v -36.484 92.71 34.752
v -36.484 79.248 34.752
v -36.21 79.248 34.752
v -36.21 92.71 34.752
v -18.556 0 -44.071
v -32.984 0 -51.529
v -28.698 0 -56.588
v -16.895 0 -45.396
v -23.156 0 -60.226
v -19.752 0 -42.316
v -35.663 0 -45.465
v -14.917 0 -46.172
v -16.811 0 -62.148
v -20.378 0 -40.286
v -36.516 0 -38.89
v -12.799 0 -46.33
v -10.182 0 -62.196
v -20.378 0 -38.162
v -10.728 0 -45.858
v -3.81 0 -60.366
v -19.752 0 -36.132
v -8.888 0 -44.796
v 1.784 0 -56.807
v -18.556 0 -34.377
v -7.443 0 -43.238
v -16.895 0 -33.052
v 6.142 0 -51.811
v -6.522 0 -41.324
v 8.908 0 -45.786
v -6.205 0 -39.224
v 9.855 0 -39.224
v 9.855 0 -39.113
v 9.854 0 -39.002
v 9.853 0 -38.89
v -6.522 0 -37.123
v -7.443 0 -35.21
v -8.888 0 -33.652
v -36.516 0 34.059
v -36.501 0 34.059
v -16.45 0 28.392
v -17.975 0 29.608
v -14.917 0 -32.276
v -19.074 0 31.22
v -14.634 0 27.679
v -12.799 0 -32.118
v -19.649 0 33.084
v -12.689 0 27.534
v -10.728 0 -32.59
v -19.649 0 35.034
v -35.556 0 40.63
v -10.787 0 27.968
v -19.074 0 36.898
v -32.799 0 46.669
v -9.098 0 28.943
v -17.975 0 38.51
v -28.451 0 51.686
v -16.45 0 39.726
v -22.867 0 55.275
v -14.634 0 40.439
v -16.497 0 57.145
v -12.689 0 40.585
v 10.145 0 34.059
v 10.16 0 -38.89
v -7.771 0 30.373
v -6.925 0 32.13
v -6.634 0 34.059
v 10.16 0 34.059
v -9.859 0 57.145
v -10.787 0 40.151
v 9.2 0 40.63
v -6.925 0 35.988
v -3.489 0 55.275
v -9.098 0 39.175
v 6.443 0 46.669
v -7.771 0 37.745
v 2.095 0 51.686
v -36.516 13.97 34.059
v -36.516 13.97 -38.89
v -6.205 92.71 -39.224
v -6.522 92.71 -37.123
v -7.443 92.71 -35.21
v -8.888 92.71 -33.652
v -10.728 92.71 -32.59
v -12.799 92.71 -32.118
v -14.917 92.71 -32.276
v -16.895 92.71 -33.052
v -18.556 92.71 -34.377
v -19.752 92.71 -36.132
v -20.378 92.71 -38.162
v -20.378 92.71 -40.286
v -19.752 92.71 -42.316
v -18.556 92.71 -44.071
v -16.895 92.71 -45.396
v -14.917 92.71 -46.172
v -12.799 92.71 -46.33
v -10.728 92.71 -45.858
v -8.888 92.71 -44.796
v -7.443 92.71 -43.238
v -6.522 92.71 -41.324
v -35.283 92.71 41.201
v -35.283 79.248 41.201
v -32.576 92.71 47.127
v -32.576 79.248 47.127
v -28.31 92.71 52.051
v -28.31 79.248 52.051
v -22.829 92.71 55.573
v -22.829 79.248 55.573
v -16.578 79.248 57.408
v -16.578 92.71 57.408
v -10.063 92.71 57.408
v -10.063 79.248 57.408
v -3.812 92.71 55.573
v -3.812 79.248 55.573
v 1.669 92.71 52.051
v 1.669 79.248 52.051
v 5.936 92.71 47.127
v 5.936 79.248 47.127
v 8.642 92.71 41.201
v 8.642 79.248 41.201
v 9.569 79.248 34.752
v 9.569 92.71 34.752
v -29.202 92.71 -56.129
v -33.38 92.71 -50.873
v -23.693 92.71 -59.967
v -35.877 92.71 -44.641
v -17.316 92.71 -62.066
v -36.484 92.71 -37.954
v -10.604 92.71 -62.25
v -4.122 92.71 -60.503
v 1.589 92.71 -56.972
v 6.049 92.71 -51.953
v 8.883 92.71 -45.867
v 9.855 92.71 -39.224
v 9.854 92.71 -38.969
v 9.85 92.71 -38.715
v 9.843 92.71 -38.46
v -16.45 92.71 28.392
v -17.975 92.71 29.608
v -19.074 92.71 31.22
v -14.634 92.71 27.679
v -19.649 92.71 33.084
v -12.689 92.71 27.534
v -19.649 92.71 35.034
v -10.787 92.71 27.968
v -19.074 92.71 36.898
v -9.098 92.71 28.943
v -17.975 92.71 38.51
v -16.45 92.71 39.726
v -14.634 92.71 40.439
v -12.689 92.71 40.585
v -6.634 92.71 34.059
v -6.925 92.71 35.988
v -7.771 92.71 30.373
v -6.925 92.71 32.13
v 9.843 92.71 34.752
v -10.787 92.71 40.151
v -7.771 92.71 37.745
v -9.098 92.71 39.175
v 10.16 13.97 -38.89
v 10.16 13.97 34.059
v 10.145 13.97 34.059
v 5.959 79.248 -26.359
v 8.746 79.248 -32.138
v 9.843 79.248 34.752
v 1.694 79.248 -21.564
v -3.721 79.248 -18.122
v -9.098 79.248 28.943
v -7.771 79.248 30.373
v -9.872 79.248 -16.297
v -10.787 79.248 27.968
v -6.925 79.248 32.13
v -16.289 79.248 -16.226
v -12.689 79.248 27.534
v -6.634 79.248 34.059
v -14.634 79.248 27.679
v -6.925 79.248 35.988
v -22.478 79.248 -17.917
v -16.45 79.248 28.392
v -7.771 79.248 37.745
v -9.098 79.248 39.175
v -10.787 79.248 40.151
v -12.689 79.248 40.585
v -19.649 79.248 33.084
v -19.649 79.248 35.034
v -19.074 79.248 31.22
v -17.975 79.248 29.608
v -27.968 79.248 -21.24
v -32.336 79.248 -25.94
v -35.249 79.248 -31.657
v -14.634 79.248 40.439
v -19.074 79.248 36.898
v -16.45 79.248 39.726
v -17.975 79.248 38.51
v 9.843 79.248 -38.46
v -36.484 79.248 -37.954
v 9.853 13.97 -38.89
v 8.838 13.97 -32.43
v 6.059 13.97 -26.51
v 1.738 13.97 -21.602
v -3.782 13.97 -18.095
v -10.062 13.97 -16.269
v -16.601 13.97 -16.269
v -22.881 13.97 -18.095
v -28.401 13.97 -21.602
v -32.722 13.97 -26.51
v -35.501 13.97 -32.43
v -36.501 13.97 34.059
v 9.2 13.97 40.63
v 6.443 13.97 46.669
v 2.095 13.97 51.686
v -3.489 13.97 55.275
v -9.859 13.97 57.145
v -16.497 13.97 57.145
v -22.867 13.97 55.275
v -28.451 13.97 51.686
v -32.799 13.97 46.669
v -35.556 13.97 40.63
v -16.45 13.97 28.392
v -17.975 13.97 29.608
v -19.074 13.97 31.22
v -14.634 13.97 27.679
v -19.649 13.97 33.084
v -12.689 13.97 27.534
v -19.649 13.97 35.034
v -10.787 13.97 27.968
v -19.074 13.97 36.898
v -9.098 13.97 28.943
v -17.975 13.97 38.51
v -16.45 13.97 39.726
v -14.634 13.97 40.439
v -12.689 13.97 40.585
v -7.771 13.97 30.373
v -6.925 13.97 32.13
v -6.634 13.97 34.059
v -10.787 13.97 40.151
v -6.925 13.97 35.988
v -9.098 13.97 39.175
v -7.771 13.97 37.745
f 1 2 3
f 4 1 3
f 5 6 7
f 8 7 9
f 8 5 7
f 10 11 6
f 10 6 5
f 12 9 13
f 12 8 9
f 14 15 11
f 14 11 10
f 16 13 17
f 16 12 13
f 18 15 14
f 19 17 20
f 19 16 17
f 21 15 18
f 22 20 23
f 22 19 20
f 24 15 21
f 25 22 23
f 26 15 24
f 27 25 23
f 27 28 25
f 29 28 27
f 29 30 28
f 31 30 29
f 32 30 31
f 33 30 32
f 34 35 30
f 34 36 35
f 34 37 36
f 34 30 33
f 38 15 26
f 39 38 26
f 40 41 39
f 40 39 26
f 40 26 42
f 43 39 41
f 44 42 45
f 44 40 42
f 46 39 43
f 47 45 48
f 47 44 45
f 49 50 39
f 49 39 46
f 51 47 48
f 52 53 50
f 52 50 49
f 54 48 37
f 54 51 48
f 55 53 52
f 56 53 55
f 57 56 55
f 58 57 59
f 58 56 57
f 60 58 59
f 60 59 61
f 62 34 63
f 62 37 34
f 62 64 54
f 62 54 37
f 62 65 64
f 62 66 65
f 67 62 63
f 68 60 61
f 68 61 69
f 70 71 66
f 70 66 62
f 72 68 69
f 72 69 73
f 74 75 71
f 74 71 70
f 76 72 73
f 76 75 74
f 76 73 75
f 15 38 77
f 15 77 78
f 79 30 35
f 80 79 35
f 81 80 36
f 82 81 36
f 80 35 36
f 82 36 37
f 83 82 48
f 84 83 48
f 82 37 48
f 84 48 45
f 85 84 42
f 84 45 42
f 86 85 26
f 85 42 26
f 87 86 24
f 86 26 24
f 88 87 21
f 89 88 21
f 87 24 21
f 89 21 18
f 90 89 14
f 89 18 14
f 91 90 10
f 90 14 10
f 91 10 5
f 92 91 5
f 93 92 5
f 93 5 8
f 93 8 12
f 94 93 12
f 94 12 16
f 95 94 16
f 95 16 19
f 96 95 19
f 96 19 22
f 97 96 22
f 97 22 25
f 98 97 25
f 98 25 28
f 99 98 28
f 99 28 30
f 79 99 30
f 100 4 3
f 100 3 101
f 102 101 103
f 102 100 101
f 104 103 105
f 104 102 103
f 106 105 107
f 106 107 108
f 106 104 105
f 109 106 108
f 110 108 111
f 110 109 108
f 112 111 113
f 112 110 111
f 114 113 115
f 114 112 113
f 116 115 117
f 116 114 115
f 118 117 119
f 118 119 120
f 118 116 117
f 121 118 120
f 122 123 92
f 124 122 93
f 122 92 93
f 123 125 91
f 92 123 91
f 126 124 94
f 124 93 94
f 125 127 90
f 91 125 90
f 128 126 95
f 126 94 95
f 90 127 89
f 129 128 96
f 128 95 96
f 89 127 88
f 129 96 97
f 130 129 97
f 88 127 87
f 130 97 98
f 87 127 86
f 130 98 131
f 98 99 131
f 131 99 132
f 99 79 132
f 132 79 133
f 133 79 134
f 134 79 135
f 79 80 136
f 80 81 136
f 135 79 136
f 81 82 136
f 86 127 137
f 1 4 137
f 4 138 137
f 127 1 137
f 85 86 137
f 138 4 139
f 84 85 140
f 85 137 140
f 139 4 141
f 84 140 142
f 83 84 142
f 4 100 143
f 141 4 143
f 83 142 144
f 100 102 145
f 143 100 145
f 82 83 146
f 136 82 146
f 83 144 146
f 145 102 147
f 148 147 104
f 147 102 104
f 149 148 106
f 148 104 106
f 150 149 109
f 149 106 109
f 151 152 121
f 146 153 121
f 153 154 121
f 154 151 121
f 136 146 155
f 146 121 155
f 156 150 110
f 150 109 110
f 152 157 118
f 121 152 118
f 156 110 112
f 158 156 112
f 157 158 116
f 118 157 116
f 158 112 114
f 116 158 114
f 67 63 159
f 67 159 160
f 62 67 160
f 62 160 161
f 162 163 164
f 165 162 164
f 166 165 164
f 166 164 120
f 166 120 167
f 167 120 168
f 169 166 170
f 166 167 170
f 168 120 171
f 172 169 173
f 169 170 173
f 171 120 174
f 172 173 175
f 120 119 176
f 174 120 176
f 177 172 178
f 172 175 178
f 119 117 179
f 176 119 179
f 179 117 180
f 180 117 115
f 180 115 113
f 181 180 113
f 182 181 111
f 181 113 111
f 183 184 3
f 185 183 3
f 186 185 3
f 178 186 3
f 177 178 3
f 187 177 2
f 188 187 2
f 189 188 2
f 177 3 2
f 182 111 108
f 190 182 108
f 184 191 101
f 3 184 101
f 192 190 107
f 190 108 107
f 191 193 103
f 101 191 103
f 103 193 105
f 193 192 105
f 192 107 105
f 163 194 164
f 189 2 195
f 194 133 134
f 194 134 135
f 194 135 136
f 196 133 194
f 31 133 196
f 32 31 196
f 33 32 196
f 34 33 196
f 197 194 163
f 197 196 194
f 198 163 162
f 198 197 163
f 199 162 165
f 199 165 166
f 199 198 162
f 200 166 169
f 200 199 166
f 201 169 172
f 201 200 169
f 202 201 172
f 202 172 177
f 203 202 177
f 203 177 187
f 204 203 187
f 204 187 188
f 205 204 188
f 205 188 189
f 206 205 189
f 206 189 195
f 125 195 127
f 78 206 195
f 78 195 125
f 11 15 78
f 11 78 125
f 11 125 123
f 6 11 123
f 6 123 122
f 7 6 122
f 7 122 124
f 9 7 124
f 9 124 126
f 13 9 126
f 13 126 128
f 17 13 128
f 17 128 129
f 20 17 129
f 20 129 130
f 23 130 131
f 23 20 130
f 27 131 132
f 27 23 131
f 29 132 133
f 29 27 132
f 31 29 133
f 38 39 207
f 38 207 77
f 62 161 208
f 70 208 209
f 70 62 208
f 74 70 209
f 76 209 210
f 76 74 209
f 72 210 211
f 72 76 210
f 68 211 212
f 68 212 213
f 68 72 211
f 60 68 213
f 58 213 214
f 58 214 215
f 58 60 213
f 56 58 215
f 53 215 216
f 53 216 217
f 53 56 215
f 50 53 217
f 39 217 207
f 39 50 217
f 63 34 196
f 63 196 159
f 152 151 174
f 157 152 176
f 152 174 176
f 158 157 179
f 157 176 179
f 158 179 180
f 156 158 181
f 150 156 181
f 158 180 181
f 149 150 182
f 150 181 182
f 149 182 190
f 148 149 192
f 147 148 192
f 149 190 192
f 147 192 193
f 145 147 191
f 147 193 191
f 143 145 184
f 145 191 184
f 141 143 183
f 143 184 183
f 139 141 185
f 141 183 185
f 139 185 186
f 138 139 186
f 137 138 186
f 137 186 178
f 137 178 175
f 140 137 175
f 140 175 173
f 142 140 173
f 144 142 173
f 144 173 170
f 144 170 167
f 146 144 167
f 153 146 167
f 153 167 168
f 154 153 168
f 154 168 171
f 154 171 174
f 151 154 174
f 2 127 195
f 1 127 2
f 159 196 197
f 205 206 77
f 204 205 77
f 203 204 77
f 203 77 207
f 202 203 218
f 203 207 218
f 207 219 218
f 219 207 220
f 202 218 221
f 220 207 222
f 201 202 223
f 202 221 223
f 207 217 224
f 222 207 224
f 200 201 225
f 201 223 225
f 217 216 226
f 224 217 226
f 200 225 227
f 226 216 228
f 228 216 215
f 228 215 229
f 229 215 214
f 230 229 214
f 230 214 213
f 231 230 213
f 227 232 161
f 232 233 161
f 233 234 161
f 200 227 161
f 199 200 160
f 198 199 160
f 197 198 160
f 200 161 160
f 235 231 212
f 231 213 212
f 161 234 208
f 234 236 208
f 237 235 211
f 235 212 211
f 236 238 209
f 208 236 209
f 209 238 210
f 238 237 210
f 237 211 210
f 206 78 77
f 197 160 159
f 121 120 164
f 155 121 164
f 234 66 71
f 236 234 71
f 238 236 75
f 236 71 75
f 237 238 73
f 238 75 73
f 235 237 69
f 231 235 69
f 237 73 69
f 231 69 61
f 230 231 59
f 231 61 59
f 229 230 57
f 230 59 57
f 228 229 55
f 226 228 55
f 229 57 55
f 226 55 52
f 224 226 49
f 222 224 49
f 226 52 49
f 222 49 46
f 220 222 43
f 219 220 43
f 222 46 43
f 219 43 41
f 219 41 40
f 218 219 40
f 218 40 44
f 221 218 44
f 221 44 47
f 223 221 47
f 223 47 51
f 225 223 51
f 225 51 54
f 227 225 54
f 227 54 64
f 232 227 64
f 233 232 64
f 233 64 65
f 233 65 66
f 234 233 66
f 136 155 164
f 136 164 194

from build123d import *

# Parameters (mm, degrees)
F0_R      = 23.1868953792
F1_DEPTH  = 92.71
F3_DEPTH  = 13.97
F5_DEPTH  = 13.97
F7_DEPTH  = 13.462
F9_DEPTH  = 13.462
F10_R     = 7.1263406122
F11_DEPTH = 92.711
F12_R     = 6.5437745526
F13_DEPTH = 92.711


with BuildPart() as f1:
    # F0 (on Front) → F1 (new body)
    with BuildSketch(Plane.XZ):
        with Locations((-13.3315408602, -39.2239503562)):
            Circle(F0_R)
    extrude(amount=-F1_DEPTH)

    # F2 (on face) → F3 (join)
    with BuildSketch(Plane.XZ):
        with BuildLine():
            Line((-36.5160371978, 34.0590924025), (-36.5160371978, -38.8904134022))
            ThreePointArc((-36.5160371978, -38.8904134022), (-13.3315408602, -16.0370549771), (9.8529554773, -38.8904134022))
            Line((9.8529554773, -38.8904134022), (10.1600009948, -38.8904134022))
            Line((10.1600009948, -38.8904134022), (10.1600009948, 34.0590924025))
            Line((10.1600009948, 34.0590924025), (-36.5160371978, 34.0590924025))
        make_face()
    extrude(amount=-F3_DEPTH)

    # F4 (on face) → F5 (join)
    with BuildSketch(Plane.XZ):
        with BuildLine():
            Line((-36.5011457602, 34.0590924025), (10.1451095572, 34.0590924025))
            ThreePointArc((10.1451095572, 34.0590924025), (-13.1780181015, 57.3822200612), (-36.5011457602, 34.0590924025))
        make_face()
    extrude(amount=-F5_DEPTH)

    # F6 (on face) → F7 (join)
    with BuildSketch(Plane(origin=(0, 92.71, 0), x_dir=(-1, 0, 0), z_dir=(0, 1, 0))):
        with BuildLine():
            Line((-9.8427801074, 34.751817584), (-9.8427801074, -38.4604289001))
            ThreePointArc((-9.8427801074, -38.4604289001), (13.0780994515, -16.038440123), (36.4836342633, -37.954033673))
            Line((36.4836342633, -37.954033673), (36.4836342633, 34.751817584))
            Line((36.4836342633, 34.751817584), (-9.8427801074, 34.751817584))
        make_face()
    extrude(amount=-F7_DEPTH)

    # F8 (on face) → F9 (join)
    with BuildSketch(Plane(origin=(0, 92.71, 0), x_dir=(-1, 0, 0), z_dir=(0, 1, 0))):
        with BuildLine():
            Line((-9.5691616246, 34.751817584), (36.2100157805, 34.751817584))
            ThreePointArc((36.2100157805, 34.751817584), (13.3204270779, 57.6414062866), (-9.5691616246, 34.751817584))
        make_face()
    extrude(amount=-F9_DEPTH)

    # F10 (on face) → F11 (cut, through all)
    with BuildSketch(Plane.XZ):
        with Locations((-13.3315408602, -39.2239503562)):
            Circle(F10_R)
    extrude(amount=-F11_DEPTH, mode=Mode.SUBTRACT)

    # F12 (on face) → F13 (cut, through all)
    with BuildSketch(Plane.XZ):
        with Locations((-13.1780181015, 34.0590924025)):
            Circle(F12_R)
    extrude(amount=-F13_DEPTH, mode=Mode.SUBTRACT)


solid = f1.part
